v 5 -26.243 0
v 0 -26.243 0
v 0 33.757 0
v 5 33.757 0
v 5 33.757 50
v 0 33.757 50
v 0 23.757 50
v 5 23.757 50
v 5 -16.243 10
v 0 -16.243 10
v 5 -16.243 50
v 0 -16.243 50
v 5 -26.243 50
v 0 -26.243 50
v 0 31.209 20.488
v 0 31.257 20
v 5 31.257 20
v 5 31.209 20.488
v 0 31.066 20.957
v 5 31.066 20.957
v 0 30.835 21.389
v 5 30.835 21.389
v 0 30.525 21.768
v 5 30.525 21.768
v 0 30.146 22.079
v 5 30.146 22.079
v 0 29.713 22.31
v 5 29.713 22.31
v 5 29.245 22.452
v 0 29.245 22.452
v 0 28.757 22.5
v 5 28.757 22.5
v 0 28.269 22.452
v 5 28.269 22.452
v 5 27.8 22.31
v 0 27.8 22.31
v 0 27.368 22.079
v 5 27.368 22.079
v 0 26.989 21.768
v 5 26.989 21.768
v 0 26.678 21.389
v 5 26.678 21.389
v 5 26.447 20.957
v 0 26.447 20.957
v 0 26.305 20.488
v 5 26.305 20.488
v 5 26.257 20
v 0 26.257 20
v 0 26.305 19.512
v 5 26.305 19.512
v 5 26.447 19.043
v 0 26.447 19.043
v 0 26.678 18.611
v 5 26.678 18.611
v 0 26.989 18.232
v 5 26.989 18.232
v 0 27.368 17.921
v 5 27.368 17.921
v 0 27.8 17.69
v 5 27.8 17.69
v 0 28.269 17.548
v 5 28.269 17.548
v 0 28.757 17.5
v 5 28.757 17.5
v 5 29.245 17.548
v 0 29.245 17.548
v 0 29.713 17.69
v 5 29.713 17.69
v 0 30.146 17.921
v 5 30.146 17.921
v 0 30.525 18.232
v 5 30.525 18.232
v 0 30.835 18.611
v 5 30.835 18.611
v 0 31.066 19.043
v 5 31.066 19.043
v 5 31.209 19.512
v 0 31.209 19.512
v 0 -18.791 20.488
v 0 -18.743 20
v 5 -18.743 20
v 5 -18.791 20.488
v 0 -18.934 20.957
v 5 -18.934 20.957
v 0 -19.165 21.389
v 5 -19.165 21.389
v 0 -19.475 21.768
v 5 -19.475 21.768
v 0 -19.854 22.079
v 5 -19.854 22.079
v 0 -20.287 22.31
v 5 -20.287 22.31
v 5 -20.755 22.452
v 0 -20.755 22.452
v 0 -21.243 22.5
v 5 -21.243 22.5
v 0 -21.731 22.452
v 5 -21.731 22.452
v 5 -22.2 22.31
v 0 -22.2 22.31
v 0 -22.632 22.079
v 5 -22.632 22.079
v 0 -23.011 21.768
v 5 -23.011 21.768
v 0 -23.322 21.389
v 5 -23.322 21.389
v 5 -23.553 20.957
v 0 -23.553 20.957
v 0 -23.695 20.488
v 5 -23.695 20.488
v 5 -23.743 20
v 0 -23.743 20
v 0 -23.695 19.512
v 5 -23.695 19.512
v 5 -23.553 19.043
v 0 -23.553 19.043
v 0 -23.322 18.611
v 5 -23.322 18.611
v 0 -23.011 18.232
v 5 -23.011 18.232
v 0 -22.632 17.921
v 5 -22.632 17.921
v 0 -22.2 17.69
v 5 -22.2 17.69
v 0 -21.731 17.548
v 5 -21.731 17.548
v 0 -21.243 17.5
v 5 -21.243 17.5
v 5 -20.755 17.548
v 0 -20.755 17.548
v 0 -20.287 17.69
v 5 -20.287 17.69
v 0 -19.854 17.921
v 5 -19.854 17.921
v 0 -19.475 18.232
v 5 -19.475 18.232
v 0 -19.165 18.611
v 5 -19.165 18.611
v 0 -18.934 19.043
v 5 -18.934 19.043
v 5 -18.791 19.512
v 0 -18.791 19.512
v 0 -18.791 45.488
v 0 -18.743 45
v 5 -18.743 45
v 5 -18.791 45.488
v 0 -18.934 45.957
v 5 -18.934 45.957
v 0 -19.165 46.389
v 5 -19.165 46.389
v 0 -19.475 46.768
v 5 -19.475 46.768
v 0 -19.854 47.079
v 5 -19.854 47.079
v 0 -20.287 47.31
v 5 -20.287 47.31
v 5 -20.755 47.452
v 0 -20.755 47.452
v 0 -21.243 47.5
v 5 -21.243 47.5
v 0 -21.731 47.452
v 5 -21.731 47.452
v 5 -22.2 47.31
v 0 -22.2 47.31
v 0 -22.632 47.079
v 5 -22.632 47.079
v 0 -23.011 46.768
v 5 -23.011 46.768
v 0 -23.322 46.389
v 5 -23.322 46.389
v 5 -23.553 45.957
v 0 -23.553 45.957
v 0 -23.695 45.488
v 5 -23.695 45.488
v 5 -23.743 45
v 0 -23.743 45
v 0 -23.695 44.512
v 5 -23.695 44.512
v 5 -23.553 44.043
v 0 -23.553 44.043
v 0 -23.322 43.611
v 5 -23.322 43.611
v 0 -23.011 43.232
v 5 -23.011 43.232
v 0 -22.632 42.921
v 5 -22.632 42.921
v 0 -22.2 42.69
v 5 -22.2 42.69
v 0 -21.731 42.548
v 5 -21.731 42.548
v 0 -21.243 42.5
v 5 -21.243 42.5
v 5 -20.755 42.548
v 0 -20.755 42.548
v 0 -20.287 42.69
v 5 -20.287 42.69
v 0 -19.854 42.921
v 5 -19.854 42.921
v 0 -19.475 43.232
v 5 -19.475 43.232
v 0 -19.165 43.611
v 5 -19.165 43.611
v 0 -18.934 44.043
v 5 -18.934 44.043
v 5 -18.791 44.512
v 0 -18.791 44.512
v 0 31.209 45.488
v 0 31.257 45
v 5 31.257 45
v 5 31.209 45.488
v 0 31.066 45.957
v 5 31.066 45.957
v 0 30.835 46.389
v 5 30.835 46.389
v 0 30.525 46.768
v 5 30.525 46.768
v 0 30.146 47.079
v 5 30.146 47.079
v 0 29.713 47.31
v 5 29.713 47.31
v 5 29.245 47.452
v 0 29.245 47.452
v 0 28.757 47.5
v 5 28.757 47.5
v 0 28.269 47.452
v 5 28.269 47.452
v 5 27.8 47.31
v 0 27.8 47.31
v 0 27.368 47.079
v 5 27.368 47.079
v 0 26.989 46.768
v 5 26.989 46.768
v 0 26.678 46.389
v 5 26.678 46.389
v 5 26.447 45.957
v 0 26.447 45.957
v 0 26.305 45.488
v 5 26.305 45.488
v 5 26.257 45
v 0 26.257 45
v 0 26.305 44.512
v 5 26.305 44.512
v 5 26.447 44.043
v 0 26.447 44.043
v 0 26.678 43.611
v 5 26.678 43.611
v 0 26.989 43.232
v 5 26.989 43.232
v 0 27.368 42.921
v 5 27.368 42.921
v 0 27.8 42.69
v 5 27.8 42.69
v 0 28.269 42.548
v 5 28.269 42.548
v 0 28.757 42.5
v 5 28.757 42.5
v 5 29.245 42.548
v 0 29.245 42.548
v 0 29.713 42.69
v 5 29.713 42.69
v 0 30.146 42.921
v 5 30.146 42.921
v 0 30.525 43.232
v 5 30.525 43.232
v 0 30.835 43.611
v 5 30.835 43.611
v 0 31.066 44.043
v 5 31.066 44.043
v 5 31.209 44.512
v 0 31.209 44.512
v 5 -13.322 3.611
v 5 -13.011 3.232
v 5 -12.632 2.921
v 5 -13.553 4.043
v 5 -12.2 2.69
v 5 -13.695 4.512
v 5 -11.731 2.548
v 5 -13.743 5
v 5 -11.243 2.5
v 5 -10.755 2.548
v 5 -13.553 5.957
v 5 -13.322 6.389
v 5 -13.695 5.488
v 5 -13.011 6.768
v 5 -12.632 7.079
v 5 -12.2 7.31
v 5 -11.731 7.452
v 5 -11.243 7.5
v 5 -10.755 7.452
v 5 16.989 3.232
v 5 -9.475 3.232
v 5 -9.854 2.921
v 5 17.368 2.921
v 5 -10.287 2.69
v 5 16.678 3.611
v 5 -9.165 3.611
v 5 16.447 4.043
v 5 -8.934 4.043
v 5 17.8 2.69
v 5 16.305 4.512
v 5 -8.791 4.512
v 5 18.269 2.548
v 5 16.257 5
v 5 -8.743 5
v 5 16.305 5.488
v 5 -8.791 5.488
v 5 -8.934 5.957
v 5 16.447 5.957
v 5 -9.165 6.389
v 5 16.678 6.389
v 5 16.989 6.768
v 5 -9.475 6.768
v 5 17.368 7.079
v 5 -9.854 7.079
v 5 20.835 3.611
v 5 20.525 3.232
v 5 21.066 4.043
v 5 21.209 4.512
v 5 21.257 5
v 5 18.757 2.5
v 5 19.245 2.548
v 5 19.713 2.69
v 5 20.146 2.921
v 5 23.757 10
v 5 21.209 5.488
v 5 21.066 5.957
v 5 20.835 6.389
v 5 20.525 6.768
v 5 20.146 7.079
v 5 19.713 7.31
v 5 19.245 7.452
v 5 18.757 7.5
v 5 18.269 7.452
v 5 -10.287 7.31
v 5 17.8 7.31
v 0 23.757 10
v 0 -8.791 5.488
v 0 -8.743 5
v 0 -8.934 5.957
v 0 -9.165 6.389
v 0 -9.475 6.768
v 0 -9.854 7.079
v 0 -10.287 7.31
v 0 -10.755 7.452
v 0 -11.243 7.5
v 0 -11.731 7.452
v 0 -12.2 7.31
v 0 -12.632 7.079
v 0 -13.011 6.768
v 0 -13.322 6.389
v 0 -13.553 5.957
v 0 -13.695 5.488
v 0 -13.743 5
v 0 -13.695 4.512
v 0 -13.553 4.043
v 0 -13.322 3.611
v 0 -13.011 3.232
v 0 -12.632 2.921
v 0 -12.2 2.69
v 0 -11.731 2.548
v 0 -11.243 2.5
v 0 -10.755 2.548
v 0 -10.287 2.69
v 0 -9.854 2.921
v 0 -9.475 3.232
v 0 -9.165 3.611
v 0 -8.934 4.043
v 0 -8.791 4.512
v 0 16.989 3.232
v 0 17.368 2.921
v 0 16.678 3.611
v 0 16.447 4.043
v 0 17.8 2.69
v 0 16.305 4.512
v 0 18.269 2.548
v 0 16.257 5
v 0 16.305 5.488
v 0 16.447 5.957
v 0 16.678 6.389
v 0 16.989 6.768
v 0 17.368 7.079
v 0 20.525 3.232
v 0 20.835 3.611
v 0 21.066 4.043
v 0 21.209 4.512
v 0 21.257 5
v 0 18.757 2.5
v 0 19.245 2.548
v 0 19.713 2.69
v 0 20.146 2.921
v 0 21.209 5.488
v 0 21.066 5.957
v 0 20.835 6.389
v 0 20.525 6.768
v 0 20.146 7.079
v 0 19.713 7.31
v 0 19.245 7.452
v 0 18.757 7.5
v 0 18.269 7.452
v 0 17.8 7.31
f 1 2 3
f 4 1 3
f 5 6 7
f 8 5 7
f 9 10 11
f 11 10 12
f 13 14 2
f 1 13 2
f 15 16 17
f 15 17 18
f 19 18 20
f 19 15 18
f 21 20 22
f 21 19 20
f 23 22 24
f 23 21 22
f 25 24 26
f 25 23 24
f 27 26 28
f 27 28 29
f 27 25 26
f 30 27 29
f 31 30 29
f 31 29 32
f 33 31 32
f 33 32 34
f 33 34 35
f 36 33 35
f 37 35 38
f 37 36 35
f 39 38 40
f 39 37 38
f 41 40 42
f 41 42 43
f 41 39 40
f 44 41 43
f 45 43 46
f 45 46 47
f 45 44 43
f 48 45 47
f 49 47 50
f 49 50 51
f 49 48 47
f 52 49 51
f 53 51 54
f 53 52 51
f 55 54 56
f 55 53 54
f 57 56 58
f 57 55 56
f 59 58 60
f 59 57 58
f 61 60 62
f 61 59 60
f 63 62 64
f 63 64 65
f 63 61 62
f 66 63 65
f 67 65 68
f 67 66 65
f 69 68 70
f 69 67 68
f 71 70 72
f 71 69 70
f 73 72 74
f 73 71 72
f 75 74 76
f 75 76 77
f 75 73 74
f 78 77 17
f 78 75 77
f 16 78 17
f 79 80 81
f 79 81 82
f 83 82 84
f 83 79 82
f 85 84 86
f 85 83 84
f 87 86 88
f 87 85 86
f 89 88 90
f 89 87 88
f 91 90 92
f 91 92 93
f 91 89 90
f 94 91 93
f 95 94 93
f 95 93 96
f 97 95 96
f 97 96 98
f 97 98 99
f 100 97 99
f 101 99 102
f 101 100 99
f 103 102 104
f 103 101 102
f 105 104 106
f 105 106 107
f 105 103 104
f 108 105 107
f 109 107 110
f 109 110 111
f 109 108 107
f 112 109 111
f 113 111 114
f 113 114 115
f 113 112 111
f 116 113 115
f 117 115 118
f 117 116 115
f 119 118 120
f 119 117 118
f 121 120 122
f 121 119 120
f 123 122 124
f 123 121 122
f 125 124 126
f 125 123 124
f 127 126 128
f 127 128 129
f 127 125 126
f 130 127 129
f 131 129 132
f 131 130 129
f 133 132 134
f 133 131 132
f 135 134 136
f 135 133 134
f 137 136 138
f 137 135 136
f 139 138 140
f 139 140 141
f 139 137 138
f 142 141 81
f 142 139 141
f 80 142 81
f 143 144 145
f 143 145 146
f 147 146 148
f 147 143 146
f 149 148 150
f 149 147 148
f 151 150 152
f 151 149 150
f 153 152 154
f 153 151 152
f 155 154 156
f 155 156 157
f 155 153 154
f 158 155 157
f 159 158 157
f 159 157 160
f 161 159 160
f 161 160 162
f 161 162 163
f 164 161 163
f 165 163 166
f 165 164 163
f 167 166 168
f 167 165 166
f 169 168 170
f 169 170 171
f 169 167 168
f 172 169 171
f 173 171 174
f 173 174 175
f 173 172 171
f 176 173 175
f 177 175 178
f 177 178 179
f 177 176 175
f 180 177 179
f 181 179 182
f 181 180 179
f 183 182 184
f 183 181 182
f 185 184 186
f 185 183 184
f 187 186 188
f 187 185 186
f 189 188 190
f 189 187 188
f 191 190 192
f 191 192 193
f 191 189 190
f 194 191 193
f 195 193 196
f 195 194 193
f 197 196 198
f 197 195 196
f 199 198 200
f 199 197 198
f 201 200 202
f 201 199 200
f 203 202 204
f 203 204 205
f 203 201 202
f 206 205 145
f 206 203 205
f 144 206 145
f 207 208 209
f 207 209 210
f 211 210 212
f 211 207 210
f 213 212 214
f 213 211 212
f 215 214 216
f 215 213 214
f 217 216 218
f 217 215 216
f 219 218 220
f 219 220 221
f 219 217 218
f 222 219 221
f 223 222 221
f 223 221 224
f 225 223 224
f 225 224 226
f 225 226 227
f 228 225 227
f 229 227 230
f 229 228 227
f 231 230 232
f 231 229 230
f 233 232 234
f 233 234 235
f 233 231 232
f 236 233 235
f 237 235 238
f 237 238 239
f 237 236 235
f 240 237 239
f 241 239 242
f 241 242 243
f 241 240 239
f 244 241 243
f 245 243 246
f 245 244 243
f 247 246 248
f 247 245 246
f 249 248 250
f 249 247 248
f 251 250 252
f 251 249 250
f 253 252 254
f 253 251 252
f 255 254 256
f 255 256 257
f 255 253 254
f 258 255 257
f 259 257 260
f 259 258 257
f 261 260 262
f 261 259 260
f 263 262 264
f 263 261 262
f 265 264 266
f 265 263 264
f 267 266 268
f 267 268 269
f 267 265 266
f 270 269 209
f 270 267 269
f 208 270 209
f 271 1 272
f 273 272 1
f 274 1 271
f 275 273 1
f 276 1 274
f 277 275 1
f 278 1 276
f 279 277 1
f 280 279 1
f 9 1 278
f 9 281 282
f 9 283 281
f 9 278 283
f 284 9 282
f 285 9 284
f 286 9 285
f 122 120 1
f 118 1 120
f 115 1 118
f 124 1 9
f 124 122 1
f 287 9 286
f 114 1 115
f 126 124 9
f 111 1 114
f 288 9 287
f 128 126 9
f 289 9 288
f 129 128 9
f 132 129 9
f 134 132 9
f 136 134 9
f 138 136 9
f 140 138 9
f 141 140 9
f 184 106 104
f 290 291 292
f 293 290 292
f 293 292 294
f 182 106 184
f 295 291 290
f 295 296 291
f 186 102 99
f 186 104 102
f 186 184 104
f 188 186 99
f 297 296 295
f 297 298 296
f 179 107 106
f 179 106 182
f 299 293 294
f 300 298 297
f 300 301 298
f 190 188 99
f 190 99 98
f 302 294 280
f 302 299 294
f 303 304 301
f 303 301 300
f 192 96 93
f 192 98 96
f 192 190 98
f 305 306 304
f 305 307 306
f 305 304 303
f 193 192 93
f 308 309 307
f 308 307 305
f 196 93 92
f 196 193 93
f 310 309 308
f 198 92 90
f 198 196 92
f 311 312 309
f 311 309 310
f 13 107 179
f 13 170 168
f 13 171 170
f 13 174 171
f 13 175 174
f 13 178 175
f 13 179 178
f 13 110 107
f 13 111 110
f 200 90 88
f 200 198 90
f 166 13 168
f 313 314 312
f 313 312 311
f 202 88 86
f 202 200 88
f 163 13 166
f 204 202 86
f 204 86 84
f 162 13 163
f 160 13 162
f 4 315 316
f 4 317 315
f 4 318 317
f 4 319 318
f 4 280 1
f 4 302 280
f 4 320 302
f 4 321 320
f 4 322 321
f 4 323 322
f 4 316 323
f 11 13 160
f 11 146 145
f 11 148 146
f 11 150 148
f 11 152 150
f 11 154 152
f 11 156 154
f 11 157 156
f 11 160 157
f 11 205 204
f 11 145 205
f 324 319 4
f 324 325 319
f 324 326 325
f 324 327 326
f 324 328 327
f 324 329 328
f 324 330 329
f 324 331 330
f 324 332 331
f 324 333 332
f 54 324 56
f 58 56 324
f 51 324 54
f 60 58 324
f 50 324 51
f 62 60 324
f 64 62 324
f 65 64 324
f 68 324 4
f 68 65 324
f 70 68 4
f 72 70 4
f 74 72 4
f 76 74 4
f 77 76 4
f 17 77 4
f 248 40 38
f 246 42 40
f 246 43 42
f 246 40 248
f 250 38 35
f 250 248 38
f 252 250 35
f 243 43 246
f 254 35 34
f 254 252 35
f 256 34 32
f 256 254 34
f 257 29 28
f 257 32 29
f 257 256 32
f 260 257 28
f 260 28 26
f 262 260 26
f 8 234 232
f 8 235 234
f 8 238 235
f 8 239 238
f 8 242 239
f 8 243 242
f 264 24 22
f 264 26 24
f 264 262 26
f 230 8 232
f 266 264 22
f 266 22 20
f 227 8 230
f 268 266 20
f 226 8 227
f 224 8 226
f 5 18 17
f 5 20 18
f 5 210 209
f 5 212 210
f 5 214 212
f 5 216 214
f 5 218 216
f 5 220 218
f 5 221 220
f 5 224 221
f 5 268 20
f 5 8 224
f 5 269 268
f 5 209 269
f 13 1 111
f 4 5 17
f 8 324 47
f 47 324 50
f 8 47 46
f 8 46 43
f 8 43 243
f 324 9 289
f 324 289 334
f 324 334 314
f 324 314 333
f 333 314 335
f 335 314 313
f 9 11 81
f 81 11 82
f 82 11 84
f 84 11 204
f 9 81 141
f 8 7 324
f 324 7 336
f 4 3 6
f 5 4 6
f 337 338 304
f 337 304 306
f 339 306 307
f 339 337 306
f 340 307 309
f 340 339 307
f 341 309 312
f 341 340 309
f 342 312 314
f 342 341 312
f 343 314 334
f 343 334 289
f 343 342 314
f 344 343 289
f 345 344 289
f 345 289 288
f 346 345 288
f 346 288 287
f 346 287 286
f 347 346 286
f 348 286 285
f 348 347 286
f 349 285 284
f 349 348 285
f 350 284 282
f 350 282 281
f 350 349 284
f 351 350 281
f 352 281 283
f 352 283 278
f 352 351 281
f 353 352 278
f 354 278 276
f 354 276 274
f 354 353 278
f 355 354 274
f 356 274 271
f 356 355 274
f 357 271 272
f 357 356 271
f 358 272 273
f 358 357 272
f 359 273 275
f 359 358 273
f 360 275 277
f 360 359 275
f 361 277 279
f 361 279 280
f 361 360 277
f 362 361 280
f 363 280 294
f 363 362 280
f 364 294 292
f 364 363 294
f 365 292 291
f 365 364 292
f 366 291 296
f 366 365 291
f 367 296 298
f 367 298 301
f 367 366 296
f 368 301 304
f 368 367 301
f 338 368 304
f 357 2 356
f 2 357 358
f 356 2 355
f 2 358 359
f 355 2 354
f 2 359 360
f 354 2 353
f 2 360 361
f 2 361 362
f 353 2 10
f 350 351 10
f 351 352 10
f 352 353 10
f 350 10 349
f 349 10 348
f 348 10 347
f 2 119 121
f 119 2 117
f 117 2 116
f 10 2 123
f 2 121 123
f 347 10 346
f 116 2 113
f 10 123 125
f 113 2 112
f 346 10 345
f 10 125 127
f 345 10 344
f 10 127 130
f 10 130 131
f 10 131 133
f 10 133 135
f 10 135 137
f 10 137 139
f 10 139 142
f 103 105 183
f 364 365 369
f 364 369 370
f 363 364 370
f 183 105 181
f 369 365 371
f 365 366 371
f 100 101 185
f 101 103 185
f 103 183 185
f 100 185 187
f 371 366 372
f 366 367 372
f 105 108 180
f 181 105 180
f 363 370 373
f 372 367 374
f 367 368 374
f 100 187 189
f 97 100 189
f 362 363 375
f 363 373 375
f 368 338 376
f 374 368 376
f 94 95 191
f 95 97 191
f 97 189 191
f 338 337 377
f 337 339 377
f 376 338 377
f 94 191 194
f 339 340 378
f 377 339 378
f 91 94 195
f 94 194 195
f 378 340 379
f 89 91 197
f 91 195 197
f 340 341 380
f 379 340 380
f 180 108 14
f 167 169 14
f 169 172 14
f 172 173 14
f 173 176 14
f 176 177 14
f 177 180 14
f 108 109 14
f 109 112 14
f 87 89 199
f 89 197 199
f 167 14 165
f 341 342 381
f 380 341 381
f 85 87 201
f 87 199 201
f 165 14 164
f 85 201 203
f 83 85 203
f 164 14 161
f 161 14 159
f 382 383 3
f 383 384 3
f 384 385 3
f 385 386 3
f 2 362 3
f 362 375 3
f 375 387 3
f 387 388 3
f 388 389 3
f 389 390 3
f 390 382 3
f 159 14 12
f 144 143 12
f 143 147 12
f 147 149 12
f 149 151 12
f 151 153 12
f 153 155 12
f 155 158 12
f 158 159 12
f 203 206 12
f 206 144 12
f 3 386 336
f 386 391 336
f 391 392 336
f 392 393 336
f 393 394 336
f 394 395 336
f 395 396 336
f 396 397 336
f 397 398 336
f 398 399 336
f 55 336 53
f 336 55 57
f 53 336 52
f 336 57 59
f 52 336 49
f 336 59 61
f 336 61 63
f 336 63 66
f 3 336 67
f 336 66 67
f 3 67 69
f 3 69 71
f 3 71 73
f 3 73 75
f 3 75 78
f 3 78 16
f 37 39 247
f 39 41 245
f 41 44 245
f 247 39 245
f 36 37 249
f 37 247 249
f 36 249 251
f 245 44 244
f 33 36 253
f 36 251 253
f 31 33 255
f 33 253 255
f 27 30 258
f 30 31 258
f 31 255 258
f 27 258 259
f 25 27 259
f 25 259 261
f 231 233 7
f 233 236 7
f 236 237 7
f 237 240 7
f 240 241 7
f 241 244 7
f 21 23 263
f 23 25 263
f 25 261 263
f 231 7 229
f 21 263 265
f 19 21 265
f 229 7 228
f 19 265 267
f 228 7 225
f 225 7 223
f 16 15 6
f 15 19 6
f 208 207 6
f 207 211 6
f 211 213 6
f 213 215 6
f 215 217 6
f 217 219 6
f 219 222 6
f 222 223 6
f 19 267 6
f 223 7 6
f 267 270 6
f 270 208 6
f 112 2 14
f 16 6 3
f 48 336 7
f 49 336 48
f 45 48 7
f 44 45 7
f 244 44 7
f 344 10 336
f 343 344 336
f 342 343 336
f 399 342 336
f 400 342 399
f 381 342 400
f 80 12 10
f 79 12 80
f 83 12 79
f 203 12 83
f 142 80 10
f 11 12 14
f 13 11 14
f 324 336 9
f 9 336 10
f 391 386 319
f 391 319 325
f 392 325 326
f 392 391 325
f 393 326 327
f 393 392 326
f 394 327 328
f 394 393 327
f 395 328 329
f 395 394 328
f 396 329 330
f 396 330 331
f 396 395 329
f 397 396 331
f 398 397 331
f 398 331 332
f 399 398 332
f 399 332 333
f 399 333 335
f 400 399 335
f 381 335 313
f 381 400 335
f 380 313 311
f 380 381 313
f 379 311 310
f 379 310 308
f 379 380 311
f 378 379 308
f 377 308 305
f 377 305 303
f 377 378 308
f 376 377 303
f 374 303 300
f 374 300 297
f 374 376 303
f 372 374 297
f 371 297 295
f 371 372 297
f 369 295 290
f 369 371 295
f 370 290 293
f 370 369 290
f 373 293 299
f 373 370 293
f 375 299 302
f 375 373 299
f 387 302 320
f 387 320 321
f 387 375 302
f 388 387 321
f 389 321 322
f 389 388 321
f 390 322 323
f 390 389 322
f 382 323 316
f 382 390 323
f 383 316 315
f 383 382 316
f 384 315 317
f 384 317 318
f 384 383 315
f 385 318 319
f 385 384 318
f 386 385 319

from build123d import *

# Parameters (mm, degrees)
F0_R     = 2.5
F1_DEPTH = 5


with BuildPart() as f1:
    # F0 (on Right) → F1 (new body)
    with BuildSketch(Plane.YZ):
        Polygon((-16.243222, 50), (-26.243222, 50), (-26.243222, 0), (33.756778, 0), (33.756778, 50), (23.756778, 50), (23.756778, 10), (-16.243222, 10), align=None)
        with Locations((-11.243222, 5)):
            Circle(F0_R, mode=Mode.SUBTRACT)
        with Locations((-21.243222, 20)):
            Circle(F0_R, mode=Mode.SUBTRACT)
        with Locations((18.756778, 5)):
            Circle(F0_R, mode=Mode.SUBTRACT)
        with Locations((28.756778, 20)):
            Circle(F0_R, mode=Mode.SUBTRACT)
        with Locations((-21.243222, 45)):
            Circle(F0_R, mode=Mode.SUBTRACT)
        with Locations((28.756778, 45)):
            Circle(F0_R, mode=Mode.SUBTRACT)
    extrude(amount=F1_DEPTH)


solid = f1.part
